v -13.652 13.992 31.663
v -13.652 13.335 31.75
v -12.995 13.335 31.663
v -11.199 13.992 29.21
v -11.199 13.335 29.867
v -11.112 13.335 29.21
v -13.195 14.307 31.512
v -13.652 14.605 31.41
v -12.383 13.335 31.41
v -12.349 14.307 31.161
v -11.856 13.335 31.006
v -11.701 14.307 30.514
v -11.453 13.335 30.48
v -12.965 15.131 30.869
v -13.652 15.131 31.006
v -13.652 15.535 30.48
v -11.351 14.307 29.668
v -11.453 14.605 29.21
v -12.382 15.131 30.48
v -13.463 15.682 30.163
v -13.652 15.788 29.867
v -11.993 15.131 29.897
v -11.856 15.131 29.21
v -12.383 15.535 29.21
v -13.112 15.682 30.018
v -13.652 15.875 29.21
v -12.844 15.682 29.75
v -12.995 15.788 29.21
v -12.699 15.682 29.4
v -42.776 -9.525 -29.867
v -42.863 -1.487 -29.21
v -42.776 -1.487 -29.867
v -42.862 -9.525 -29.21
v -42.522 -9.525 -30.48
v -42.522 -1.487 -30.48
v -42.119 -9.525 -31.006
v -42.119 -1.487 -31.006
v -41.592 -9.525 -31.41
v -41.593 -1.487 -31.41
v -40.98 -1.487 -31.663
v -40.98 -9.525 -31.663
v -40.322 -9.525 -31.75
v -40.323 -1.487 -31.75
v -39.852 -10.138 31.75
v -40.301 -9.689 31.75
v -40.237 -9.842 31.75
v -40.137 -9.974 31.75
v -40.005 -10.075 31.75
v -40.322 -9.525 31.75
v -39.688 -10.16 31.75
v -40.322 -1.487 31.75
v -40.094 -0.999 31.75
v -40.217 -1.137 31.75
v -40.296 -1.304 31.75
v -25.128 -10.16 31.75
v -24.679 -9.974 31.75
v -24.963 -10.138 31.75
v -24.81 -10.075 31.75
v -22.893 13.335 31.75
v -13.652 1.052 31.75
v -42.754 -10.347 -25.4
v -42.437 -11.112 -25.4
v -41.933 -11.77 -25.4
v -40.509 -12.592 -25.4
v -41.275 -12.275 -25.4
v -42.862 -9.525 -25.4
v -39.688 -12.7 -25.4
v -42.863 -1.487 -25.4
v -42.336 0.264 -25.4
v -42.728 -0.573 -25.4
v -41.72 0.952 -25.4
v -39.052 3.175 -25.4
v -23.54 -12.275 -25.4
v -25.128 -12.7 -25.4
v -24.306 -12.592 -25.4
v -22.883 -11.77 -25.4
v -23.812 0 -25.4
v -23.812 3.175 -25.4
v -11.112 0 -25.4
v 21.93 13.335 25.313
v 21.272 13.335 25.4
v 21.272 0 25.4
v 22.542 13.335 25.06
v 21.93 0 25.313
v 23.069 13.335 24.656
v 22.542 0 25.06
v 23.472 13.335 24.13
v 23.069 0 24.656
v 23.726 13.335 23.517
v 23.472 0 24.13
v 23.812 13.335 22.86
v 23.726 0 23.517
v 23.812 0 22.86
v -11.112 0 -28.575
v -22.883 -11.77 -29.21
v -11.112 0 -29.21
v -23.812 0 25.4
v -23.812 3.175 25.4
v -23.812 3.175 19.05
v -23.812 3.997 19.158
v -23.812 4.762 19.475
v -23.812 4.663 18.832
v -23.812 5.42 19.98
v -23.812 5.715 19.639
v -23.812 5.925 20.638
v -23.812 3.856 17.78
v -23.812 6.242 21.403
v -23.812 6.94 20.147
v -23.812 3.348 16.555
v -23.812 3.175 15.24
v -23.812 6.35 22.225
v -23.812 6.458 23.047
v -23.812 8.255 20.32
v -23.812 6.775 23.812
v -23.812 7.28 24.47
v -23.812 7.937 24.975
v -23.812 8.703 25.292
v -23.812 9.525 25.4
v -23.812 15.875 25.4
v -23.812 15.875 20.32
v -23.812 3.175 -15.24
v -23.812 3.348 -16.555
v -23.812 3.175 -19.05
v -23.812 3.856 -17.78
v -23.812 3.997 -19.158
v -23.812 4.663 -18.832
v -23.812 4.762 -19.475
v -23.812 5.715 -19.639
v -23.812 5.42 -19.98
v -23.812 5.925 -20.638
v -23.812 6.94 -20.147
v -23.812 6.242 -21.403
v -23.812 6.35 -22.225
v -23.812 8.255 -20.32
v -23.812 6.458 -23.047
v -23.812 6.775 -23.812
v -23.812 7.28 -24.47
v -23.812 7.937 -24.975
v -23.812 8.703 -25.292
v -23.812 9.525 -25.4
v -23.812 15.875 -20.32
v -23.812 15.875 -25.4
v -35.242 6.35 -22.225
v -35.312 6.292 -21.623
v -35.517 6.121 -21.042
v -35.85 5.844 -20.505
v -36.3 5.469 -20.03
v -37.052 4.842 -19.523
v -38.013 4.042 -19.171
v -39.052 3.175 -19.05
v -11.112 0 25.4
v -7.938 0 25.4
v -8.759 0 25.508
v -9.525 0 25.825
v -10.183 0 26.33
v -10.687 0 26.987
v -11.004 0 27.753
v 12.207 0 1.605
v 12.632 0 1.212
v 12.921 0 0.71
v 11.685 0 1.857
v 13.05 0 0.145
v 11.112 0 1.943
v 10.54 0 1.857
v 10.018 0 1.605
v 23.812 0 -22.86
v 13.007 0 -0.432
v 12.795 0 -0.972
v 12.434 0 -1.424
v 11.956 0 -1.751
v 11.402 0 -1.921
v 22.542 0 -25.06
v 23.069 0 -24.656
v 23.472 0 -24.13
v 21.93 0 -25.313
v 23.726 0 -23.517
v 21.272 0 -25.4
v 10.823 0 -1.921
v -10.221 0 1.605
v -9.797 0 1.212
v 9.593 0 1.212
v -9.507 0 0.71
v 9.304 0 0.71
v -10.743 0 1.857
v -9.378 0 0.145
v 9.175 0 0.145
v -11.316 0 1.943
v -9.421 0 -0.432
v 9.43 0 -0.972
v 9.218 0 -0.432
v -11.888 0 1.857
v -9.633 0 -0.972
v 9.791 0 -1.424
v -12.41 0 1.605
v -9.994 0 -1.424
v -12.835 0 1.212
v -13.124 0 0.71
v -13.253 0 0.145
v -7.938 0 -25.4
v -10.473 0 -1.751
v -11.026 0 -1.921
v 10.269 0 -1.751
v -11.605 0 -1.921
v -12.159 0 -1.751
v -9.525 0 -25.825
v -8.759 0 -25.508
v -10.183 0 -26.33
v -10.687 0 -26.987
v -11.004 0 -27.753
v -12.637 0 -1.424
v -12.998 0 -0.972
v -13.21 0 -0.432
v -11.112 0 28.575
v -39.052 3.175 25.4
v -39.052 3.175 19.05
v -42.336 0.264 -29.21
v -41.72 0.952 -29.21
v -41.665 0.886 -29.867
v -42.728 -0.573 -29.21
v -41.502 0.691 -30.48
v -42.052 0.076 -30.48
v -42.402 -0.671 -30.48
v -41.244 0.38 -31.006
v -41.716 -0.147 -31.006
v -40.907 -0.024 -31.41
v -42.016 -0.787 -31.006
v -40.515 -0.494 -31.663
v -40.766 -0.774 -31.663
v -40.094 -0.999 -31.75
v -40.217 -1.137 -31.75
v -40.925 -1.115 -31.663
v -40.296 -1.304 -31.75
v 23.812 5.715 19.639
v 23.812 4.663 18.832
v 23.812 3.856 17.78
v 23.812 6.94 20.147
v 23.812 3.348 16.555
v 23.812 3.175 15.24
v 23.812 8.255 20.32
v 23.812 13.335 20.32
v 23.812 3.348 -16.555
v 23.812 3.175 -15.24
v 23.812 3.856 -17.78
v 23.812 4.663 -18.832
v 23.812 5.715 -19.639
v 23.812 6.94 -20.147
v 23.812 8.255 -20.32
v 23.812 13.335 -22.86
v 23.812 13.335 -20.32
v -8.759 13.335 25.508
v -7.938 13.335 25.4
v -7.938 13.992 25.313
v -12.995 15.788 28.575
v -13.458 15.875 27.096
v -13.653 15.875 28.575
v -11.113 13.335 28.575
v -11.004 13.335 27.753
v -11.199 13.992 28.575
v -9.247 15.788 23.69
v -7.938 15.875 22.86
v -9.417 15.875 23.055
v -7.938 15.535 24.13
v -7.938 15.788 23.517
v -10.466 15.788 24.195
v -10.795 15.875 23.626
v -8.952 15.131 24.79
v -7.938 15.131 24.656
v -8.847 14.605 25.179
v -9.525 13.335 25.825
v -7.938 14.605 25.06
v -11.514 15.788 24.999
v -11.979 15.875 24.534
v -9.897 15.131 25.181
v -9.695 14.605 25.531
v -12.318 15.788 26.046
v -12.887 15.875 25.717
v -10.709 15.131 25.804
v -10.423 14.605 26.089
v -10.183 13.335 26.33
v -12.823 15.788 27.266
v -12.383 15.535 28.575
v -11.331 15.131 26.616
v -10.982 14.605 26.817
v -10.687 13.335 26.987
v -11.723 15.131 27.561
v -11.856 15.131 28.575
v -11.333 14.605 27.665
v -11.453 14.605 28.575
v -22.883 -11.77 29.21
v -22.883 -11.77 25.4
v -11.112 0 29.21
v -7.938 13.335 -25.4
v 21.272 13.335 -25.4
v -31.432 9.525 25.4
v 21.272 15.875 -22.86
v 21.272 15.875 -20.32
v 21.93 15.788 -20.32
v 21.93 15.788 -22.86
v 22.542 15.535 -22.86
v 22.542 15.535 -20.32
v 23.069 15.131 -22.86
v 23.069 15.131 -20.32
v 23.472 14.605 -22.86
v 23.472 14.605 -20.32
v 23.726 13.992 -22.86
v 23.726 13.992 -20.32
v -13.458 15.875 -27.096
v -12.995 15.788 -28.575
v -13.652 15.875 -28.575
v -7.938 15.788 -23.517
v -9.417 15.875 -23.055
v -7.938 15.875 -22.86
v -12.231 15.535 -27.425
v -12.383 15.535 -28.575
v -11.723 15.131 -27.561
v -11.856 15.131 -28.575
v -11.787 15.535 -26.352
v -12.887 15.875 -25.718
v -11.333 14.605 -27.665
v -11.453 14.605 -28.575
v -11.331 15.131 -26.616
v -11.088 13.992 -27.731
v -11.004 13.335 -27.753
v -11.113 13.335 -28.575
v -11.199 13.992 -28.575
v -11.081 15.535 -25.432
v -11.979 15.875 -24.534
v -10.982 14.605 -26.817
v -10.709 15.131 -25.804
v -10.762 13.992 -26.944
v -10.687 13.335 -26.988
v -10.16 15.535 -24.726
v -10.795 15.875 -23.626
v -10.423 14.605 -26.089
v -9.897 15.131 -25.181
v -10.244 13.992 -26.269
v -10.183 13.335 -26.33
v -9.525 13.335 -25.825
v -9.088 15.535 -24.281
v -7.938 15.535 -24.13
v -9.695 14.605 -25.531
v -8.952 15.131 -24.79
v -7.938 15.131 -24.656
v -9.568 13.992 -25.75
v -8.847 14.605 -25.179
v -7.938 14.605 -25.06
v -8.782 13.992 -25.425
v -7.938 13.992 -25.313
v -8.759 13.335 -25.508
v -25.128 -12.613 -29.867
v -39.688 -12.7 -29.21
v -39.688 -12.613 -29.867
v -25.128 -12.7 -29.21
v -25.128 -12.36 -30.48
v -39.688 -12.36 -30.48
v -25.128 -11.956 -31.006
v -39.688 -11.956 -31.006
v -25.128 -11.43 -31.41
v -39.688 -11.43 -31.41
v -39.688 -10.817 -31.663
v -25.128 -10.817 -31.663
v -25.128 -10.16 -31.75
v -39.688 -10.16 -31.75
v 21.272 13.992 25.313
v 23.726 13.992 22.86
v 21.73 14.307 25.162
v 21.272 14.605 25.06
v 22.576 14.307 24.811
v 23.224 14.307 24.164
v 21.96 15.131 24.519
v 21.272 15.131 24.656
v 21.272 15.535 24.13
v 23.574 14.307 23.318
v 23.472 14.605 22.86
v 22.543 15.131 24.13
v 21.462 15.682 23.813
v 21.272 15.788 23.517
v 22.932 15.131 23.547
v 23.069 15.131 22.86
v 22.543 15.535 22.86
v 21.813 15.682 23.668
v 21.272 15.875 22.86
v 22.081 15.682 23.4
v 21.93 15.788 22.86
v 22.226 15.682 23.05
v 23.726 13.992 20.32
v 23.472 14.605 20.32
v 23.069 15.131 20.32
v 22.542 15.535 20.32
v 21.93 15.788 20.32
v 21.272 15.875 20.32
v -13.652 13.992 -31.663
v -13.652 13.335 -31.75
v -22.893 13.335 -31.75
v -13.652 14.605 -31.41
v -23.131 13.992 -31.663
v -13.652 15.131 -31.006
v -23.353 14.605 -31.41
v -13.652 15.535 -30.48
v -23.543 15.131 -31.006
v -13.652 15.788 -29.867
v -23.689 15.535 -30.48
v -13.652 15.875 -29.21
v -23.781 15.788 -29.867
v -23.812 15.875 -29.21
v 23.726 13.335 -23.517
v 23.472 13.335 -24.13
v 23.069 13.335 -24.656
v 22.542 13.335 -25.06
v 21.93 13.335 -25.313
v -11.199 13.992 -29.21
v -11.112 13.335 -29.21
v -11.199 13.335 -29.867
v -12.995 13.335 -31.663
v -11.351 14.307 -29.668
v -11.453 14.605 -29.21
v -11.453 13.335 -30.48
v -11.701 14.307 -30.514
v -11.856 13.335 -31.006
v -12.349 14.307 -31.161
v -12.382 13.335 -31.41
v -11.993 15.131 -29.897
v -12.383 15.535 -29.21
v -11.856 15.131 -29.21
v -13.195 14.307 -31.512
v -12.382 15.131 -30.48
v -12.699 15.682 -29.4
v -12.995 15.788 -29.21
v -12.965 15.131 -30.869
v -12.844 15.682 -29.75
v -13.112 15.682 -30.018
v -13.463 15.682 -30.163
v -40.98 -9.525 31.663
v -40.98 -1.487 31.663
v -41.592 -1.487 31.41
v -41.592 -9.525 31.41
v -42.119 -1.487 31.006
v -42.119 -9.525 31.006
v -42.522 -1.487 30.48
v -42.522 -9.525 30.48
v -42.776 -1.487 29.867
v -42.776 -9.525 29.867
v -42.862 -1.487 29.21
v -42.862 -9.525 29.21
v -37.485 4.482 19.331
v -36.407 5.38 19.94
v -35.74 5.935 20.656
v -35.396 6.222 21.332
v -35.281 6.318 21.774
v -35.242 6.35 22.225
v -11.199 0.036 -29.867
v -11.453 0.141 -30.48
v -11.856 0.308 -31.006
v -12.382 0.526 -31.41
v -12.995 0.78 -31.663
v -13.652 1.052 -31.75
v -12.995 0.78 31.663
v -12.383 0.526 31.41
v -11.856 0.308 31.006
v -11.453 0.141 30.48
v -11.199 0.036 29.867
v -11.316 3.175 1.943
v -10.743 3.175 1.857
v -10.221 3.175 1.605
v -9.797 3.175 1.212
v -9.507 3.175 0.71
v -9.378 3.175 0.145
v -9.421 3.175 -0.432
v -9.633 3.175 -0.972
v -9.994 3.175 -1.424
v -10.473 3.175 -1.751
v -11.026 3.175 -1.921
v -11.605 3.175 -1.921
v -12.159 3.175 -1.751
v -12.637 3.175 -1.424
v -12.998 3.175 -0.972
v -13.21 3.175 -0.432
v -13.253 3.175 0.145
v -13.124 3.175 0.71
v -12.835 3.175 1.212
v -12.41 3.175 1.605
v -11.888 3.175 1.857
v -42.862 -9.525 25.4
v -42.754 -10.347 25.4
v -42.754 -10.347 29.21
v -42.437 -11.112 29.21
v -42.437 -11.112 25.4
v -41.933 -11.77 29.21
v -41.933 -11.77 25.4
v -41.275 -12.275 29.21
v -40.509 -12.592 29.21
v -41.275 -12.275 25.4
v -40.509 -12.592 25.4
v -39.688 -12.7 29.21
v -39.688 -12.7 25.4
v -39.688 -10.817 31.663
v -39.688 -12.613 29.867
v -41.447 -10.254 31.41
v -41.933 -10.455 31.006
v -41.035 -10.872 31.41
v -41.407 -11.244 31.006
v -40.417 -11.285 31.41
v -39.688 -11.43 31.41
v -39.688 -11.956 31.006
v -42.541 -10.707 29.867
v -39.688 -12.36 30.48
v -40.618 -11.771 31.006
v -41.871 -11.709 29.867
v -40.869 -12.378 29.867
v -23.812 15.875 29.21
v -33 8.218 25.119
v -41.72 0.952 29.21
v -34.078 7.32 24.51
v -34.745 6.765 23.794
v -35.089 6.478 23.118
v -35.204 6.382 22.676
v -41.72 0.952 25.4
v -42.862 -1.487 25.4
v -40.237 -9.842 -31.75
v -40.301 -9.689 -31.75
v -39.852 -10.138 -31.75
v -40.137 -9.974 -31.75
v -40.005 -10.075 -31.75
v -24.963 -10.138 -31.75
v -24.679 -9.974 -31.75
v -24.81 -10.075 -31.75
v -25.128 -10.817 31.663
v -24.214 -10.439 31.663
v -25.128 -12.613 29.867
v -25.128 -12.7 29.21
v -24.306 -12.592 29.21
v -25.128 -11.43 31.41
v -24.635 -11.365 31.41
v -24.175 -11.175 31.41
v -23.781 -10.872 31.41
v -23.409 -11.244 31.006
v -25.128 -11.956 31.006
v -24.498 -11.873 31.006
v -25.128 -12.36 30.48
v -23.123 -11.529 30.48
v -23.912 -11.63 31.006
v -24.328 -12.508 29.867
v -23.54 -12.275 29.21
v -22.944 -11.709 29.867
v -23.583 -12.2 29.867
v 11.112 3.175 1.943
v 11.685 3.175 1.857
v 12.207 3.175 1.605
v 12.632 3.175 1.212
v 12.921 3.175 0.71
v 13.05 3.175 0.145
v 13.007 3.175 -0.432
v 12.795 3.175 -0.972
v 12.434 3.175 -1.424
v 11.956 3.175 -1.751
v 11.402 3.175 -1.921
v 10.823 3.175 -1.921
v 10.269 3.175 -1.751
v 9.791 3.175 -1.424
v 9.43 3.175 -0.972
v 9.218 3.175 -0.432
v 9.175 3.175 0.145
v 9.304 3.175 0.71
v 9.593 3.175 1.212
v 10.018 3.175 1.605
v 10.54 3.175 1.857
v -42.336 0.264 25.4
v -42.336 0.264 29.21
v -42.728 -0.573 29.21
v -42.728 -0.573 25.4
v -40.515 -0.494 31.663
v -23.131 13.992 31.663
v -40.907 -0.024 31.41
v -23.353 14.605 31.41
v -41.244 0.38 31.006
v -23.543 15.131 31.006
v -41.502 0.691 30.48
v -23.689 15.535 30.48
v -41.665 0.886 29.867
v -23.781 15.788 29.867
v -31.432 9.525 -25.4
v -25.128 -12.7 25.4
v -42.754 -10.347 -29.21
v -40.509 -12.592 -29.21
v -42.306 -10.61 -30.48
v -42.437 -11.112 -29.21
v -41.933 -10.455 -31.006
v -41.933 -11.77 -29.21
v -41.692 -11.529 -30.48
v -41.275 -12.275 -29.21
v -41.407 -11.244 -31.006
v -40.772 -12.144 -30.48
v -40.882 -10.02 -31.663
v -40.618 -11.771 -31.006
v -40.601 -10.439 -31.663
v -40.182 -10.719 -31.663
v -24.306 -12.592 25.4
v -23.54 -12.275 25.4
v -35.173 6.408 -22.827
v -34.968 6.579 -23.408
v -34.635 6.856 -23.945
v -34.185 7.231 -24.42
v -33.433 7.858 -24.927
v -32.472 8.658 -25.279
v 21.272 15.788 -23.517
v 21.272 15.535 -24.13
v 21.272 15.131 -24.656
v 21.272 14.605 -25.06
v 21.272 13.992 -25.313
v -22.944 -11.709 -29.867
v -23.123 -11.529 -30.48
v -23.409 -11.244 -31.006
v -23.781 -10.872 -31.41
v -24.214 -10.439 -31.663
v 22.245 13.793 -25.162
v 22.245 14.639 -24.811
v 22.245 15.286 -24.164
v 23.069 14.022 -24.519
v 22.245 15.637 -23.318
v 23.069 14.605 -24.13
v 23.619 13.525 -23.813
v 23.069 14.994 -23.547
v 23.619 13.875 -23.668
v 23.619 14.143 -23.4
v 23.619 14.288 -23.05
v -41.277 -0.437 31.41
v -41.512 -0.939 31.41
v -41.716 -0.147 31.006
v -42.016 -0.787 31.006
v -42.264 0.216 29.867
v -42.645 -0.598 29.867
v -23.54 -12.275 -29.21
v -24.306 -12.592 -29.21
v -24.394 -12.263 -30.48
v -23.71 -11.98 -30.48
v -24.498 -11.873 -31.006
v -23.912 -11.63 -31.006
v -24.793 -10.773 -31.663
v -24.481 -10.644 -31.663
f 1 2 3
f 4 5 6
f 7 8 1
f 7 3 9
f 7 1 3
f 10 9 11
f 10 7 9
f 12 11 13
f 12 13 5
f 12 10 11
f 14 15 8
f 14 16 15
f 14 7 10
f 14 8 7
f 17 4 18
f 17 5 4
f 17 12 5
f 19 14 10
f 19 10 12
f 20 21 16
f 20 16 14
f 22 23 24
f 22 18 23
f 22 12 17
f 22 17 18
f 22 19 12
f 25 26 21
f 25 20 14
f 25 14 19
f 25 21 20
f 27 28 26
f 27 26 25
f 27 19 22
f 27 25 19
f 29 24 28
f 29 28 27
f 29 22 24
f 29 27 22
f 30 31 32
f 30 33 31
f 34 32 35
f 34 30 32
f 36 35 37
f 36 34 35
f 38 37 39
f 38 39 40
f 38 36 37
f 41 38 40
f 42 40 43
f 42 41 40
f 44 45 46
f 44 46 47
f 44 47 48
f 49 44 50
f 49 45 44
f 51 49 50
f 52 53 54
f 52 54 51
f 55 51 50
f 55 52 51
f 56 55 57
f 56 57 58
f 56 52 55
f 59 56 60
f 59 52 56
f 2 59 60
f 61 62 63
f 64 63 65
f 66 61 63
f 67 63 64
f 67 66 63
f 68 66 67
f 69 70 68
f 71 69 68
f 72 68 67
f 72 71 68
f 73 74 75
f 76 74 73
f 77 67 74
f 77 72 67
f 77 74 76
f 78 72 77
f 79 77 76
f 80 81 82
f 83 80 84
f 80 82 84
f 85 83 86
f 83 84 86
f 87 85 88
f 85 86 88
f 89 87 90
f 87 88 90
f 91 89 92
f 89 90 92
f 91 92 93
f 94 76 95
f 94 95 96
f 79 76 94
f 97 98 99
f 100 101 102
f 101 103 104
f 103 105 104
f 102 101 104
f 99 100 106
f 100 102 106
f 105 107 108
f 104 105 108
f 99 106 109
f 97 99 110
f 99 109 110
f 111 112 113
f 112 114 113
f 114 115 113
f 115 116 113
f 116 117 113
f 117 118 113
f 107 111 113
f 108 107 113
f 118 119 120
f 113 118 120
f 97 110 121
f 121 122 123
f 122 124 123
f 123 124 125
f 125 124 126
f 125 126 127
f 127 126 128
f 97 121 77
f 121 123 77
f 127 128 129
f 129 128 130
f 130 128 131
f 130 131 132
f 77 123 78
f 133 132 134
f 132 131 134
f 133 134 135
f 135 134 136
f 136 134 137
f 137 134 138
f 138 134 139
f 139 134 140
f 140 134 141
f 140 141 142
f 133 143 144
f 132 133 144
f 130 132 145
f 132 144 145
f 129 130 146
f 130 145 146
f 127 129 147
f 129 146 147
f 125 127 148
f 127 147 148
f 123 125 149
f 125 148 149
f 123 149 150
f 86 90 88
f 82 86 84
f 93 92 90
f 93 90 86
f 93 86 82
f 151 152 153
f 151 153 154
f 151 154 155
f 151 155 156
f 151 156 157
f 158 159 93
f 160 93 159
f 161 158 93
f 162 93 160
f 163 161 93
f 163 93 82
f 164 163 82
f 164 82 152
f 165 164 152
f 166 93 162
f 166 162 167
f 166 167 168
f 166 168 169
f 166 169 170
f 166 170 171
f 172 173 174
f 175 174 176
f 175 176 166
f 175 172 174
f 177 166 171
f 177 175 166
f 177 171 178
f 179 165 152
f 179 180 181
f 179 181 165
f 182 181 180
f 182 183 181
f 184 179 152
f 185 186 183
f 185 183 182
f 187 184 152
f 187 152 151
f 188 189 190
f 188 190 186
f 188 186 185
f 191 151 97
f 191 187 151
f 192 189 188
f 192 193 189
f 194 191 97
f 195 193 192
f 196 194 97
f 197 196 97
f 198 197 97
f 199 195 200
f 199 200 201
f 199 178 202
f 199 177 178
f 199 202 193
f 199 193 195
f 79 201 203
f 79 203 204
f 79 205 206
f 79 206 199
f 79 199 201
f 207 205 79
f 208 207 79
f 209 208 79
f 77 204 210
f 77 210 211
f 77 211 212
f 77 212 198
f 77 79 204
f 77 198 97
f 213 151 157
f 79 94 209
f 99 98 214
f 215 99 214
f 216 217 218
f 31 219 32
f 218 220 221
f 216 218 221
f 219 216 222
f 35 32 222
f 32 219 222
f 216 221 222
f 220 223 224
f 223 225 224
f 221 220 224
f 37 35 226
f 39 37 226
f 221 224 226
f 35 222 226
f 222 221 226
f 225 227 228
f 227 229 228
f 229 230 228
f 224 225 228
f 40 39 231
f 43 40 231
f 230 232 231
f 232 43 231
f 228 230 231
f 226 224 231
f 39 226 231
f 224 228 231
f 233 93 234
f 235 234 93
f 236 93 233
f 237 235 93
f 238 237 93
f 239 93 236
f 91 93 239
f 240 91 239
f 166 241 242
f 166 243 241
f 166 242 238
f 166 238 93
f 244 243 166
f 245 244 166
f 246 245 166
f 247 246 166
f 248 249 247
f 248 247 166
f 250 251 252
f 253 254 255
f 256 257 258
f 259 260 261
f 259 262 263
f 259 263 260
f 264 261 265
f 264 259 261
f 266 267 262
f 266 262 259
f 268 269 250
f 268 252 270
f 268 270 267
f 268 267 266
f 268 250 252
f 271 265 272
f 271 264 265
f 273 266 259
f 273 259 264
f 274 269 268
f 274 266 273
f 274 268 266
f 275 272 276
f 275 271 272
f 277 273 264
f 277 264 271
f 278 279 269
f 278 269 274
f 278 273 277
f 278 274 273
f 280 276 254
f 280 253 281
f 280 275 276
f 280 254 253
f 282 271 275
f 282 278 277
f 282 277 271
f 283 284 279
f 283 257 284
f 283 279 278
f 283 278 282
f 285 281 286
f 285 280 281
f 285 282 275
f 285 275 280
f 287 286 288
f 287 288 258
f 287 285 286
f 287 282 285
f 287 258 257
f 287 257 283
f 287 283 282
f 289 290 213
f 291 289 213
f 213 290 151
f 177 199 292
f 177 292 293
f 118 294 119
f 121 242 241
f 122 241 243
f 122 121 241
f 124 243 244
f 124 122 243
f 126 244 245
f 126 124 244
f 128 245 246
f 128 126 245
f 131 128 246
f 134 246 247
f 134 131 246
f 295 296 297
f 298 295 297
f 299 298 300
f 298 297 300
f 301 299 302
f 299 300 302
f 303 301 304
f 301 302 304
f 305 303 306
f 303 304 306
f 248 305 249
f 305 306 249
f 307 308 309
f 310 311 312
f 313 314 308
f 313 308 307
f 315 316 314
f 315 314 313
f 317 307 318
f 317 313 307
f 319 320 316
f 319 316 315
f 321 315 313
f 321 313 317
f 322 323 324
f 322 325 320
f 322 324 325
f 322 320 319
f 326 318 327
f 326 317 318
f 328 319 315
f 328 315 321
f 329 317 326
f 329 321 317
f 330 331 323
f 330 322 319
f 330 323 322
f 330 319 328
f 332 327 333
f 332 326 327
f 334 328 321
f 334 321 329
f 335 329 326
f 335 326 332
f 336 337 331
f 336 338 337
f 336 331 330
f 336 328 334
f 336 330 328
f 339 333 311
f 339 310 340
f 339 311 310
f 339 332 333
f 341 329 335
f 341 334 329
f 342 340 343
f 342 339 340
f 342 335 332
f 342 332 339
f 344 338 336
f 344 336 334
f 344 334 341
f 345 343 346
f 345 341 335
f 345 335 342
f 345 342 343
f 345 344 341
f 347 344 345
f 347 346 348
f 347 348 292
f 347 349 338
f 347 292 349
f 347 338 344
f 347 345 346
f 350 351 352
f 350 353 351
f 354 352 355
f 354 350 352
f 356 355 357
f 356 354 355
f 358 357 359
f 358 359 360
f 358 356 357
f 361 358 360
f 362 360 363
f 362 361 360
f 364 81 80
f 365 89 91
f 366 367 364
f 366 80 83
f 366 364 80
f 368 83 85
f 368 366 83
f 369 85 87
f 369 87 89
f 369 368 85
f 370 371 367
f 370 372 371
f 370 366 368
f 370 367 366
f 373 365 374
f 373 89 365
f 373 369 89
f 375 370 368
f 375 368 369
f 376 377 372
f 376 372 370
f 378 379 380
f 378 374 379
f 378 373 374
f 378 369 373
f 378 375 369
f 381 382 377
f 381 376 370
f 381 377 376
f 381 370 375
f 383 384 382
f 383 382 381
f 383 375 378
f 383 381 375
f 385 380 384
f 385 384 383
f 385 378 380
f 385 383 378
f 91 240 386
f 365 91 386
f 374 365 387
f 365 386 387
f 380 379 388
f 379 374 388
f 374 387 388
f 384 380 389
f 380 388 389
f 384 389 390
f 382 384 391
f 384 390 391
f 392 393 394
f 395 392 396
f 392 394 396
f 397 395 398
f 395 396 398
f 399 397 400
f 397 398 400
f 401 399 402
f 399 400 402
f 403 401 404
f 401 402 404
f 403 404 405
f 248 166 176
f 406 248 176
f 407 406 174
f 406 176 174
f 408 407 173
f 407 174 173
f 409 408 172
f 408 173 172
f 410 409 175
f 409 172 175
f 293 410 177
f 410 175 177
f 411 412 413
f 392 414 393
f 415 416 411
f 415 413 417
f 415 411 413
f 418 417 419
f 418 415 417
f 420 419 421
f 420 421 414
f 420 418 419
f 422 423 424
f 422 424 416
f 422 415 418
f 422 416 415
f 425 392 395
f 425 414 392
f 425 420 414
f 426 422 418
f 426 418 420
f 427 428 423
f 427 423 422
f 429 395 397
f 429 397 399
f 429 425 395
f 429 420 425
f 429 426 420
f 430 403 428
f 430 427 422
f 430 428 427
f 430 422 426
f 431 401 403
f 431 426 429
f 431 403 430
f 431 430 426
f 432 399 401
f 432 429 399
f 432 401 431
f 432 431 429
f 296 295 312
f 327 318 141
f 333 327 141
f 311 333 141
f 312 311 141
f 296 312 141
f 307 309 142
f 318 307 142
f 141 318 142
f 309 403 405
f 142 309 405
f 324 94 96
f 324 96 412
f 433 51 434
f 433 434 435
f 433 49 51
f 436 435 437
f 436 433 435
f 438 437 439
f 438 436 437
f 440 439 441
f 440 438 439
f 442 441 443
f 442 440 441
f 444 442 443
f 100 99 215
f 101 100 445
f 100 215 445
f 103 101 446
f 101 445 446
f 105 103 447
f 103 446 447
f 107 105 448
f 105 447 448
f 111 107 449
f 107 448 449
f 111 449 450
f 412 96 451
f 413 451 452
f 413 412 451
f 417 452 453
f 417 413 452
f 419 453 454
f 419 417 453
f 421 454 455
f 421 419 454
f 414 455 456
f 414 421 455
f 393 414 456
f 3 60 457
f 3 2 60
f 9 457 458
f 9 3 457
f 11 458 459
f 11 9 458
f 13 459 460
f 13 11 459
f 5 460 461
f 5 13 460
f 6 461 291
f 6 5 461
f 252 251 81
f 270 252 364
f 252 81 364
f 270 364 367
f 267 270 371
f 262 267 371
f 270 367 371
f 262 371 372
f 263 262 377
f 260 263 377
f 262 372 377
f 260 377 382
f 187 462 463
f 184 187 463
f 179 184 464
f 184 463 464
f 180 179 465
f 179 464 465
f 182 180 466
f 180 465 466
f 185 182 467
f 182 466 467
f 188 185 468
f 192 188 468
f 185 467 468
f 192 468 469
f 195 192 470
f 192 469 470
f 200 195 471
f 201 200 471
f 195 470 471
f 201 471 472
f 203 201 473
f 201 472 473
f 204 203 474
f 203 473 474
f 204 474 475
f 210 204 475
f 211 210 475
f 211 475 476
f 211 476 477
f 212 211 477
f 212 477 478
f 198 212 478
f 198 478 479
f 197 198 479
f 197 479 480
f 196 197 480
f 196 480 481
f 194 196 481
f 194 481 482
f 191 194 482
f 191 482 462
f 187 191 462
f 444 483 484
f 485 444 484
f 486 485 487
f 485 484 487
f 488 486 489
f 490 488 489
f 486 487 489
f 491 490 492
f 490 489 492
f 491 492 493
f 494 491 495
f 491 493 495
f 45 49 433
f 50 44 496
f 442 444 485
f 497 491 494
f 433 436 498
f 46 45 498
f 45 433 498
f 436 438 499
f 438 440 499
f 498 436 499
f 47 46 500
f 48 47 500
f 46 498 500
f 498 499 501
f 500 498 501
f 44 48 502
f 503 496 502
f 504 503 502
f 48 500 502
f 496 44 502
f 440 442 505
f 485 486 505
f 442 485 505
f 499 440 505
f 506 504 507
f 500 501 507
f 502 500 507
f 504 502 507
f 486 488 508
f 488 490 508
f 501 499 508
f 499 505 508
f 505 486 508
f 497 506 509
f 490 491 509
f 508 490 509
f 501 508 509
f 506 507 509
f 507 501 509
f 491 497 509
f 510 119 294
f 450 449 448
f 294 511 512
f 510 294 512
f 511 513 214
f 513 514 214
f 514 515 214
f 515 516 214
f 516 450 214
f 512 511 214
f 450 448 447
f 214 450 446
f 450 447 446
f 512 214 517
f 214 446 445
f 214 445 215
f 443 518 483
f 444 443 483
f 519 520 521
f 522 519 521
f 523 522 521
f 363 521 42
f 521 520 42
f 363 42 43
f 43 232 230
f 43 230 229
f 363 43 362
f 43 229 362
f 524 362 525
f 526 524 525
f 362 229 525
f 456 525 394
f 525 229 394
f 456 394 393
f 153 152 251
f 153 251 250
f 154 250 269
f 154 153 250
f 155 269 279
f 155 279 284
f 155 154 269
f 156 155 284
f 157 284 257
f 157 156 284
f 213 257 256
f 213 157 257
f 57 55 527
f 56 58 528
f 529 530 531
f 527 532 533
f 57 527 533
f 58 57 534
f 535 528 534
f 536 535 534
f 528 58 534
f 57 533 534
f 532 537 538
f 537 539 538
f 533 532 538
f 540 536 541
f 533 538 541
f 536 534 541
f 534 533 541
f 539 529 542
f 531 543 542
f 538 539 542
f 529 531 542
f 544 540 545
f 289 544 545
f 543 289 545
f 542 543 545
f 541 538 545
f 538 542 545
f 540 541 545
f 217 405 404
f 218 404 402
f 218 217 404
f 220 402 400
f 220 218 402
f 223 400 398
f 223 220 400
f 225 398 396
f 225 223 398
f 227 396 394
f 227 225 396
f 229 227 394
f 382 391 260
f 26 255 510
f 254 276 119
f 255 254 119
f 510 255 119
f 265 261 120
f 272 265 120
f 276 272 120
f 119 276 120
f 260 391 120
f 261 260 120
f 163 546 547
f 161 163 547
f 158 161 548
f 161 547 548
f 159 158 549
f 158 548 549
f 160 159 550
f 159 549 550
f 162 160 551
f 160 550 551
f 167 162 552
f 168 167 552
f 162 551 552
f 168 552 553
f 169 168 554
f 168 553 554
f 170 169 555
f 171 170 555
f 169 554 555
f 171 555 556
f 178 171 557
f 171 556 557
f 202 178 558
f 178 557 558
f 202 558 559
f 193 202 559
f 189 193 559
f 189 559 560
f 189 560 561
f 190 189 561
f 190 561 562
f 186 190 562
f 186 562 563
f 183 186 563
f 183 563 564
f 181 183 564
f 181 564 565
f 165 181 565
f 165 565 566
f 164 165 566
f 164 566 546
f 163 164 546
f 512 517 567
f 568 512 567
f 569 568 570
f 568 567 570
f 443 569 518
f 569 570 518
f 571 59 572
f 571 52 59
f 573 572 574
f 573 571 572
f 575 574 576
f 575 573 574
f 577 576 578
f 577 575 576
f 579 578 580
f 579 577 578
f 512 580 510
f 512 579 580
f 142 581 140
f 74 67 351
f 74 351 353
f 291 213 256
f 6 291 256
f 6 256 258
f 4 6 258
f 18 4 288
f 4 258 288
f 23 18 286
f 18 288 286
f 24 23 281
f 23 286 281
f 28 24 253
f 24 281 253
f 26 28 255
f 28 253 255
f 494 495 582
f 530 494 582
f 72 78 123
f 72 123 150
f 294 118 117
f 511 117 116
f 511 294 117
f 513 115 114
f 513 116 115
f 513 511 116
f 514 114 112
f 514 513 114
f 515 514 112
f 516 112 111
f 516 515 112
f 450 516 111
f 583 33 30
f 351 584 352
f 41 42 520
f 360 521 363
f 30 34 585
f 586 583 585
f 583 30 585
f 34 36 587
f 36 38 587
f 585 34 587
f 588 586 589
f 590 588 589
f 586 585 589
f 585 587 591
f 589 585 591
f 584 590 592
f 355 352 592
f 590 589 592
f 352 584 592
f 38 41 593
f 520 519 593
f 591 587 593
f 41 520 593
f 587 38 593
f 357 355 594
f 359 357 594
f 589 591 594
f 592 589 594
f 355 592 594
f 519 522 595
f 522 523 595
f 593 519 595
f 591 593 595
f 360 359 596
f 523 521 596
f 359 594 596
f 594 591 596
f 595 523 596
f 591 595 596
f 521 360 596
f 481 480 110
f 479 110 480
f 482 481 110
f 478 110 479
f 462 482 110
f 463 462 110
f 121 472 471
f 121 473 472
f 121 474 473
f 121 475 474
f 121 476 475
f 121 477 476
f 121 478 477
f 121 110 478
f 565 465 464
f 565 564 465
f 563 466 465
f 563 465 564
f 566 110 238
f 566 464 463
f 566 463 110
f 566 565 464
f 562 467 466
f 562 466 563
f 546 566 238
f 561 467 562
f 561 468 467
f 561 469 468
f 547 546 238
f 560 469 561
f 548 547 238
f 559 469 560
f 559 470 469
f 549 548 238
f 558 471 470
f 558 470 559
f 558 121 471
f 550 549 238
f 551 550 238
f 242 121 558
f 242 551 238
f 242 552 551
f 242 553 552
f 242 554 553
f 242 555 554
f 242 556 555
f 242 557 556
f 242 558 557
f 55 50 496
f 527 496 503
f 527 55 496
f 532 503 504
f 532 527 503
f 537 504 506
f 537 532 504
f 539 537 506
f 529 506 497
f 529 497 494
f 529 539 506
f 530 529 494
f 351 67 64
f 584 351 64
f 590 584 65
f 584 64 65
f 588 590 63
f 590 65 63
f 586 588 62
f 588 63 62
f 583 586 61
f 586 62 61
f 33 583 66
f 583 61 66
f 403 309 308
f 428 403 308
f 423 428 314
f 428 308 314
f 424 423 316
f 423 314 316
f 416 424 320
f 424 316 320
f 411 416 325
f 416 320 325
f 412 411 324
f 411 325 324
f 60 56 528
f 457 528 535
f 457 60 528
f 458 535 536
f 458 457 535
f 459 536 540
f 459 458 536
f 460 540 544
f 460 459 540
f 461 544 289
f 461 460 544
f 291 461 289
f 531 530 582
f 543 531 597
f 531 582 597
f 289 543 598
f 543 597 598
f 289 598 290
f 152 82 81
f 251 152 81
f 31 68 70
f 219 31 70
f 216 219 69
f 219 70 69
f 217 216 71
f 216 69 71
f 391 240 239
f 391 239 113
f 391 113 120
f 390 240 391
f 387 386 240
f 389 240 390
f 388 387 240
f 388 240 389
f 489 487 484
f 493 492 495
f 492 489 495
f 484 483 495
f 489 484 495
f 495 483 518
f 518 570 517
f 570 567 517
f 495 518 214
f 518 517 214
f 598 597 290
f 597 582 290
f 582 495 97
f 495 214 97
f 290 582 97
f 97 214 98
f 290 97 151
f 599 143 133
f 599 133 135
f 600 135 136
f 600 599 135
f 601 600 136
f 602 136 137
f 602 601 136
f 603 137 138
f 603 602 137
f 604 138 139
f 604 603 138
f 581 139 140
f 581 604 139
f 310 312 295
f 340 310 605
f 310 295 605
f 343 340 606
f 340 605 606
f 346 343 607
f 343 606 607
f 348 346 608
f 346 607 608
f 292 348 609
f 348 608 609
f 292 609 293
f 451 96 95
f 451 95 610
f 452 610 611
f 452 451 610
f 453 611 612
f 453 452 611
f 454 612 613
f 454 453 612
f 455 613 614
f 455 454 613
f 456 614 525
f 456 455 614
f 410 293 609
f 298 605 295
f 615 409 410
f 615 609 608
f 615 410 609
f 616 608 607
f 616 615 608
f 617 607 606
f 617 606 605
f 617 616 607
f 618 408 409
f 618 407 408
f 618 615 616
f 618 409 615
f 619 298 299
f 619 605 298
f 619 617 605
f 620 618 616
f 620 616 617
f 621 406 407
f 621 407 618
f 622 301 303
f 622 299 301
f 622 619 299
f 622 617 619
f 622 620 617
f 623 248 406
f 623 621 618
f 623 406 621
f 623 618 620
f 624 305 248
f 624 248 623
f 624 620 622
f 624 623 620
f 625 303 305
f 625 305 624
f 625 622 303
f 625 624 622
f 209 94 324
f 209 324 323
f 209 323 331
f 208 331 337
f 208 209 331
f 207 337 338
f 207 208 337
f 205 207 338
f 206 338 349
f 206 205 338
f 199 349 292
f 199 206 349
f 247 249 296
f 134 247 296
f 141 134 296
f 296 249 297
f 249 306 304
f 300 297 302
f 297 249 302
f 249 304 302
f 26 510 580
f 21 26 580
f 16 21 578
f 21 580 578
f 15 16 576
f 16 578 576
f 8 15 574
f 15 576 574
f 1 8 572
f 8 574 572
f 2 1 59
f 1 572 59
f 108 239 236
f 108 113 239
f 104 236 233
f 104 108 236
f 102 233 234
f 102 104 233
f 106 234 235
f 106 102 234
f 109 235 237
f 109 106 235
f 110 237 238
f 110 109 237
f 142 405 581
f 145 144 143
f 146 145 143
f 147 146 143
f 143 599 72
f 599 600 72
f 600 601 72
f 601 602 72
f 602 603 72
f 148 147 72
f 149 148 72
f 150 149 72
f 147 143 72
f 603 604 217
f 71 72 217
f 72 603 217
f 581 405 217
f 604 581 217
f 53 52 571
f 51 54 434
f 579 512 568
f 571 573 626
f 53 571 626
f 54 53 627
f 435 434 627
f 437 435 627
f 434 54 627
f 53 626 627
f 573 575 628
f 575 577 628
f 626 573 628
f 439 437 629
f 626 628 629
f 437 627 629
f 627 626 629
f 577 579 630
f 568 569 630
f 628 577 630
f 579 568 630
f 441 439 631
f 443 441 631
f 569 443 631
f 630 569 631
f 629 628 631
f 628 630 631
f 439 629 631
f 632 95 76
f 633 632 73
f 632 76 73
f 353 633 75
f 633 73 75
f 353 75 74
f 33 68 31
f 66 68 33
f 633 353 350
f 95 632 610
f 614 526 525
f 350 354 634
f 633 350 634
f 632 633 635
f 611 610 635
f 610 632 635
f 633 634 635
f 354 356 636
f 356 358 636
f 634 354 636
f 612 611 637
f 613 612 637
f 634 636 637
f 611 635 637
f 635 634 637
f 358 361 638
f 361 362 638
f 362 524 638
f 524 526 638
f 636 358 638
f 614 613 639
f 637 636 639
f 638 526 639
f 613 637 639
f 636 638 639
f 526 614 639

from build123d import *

# Parameters (mm, degrees)
SKETCH1_W           = 47.625
SKETCH1_H           = 50.8
BOSS_EXTRUDE1_DEPTH = 3.175
SKETCH2_R           = 1.9431
CUT_EXTRUDE1_DEPTH  = 35.961060929
SKETCH3_W           = 5.08
SKETCH3_H           = 12.7
BOSS_EXTRUDE2_DEPTH = 47.625
FILLET1_R           = 5.08
BOSS_EXTRUDE4_DEPTH = 6.35
FILLET4_R           = 3.175
BOSS_EXTRUDE5_DEPTH = 6.35
FILLET6_R           = 3.175
BOSS_EXTRUDE6_DEPTH = 6.35
FILLET8_R           = 3.175
FILLET9_R           = 3.175
FILLET10_R          = 2.54
FILLET11_R          = 2.54
FILLET12_R          = 2.54


with BuildPart() as part:
    # Sketch1 → Boss-Extrude1 (new body)
    with BuildSketch(Plane(origin=(0, 0, 0), x_dir=(1, 0, 0), z_dir=(0, 1, 0))):
        Rectangle(SKETCH1_W, SKETCH1_H)
    extrude(amount=BOSS_EXTRUDE1_DEPTH)

    # Sketch2 → Cut-Extrude1 (cut, through all)
    with BuildSketch(Plane(origin=(0, 3.175, 0), x_dir=(1, 0, 0), z_dir=(0, 1, 0))):
        with Locations(Location((11.1125, 0, 0), (0, 0, 270))):
            Circle(SKETCH2_R)
        with Locations(Location((-11.3157, 0, 0), (0, 0, 270))):
            Circle(SKETCH2_R)
    extrude(amount=-CUT_EXTRUDE1_DEPTH, mode=Mode.SUBTRACT)

    # Sketch3 → Boss-Extrude2 (add)
    with BuildSketch(Plane(origin=(23.8125, 0, 0), x_dir=(0, 0, -1), z_dir=(1, 0, 0))):
        with Locations((-22.86, 9.525)):
            Rectangle(SKETCH3_W, SKETCH3_H)
        with Locations((22.86, 9.525)):
            Rectangle(SKETCH3_W, SKETCH3_H)
    extrude(amount=-BOSS_EXTRUDE2_DEPTH)

    # Fillet1
    fillet1_edges = [part.edges().sort_by_distance(p)[0] for p in [
        (0, 3.175, 20.32),
        (0, 3.175, -20.32),
    ]]
    fillet(fillet1_edges, radius=FILLET1_R)

    # Sketch5 → Boss-Extrude4 (add)
    with BuildSketch(Plane(origin=(0, 0, -25.4), x_dir=(-1, 0, 0), z_dir=(0, 0, -1))):
        Polygon((11.1125, 15.875), (23.8125, 15.875), (42.8625, 0), (42.8625, -12.7), (23.8125, -12.7), (11.1125, 0), align=None)
    extrude(amount=BOSS_EXTRUDE4_DEPTH)

    # Fillet4
    # the kernel refuses this fillet: 3.175 mm, written as the material it adds along each edge
    with BuildSketch(Plane(origin=(-11.1125, 0, -25.4), x_dir=(1, 0, 0), z_dir=(0, 1, 0))) as fillet4_piece_1:
        with BuildLine():
            CenterArc((FILLET4_R, FILLET4_R), FILLET4_R, 180, 90)
            Line((0, FILLET4_R), (0, 0))
            Line((0, 0), (FILLET4_R, 0))
        make_face()
    extrude(amount=15.875)
    # the kernel refuses this fillet: 3.175 mm, written as the material it takes off along each edge
    with BuildSketch(Plane(origin=(-23.8125, -12.7, -22.112179849), x_dir=(0.7071067811865468, 0.7071067811865482, 0), z_dir=(0, 0, -1))) as fillet4_2_piece_1:
        with BuildLine():
            CenterArc((FILLET4_R * 0.414213562373, -FILLET4_R), FILLET4_R, 90, 45)
            Line((-FILLET4_R * 0.292893218813, -FILLET4_R * 0.292893218813), (0, 0))
            Line((0, 0), (FILLET4_R * 0.414213562373, 0))
        make_face()
    extrude(amount=12.925640303, mode=Mode.SUBTRACT)
    with BuildSketch(Plane(origin=(-42.8625, -12.7, -17.4625), x_dir=(1, 0, 0), z_dir=(0, 0, -1))) as fillet4_2_piece_2:
        with BuildLine():
            CenterArc((FILLET4_R, -FILLET4_R), FILLET4_R, 90, 90)
            Line((0, -FILLET4_R), (0, 0))
            Line((0, 0), (FILLET4_R, 0))
        make_face()
    extrude(amount=22.225, mode=Mode.SUBTRACT)
    with BuildSketch(Plane(origin=(-42.8625, 0, -21.682273866), x_dir=(0.7682212795973764, 0.6401843996644792, 0), z_dir=(0, 0, -1))) as fillet4_2_piece_3:
        with BuildLine():
            CenterArc((FILLET4_R * 0.468374945984, FILLET4_R), FILLET4_R, 219.805571092, 50.194428908)
            Line((-FILLET4_R * 0.299846333613, FILLET4_R * 0.359815600336), (0, 0))
            Line((0, 0), (FILLET4_R * 0.468374945984, 0))
        make_face()
    extrude(amount=13.785452268, mode=Mode.SUBTRACT)

    # Sketch6 → Boss-Extrude5 (add)
    with BuildSketch(Plane.XY.offset(25.4)):
        Polygon((-11.1125, 15.875), (-23.8125, 15.875), (-42.8625, 0), (-42.8625, -12.7), (-23.8125, -12.7), (-11.1125, 0), align=None)
    extrude(amount=BOSS_EXTRUDE5_DEPTH)

    # Fillet6
    # the kernel refuses this fillet: 3.175 mm, written as the material it adds along each edge
    with BuildSketch(Plane(origin=(-11.1125, 0, 25.4), x_dir=(1, 0, 0), z_dir=(0, 1, 0))) as fillet6_piece_1:
        with BuildLine():
            CenterArc((FILLET6_R, -FILLET6_R), FILLET6_R, 90, 90)
            Line((0, -FILLET6_R), (0, 0))
            Line((0, 0), (FILLET6_R, 0))
        make_face()
    extrude(amount=15.875)
    # the kernel refuses this fillet: 3.175 mm, written as the material it takes off along each edge
    with BuildSketch(Plane(origin=(-42.8625, 0, 21.682273866), x_dir=(0, -1, 0), z_dir=(0, 0, 1))) as fillet6_2_piece_1:
        with BuildLine():
            CenterArc((FILLET6_R * 0.468374945984, FILLET6_R), FILLET6_R, 219.805571092, 50.194428908)
            Line((-FILLET6_R * 0.299846333613, FILLET6_R * 0.359815600336), (0, 0))
            Line((0, 0), (FILLET6_R * 0.468374945984, 0))
        make_face()
    extrude(amount=13.785452268, mode=Mode.SUBTRACT)
    with BuildSketch(Plane(origin=(-42.8625, -12.7, 17.4625), x_dir=(1, 0, 0), z_dir=(0, 0, 1))) as fillet6_2_piece_2:
        with BuildLine():
            CenterArc((FILLET6_R, FILLET6_R), FILLET6_R, 180, 90)
            Line((0, FILLET6_R), (0, 0))
            Line((0, 0), (FILLET6_R, 0))
        make_face()
    extrude(amount=22.225, mode=Mode.SUBTRACT)
    with BuildSketch(Plane(origin=(-23.8125, -12.7, 22.112179849), x_dir=(0.7071067811865468, 0.7071067811865482, 0), z_dir=(0, 0, 1))) as fillet6_2_piece_3:
        with BuildLine():
            CenterArc((FILLET6_R * 0.414213562373, FILLET6_R), FILLET6_R, 225, 45)
            Line((-FILLET6_R * 0.292893218813, FILLET6_R * 0.292893218813), (0, 0))
            Line((0, 0), (FILLET6_R * 0.414213562373, 0))
        make_face()
    extrude(amount=12.925640303, mode=Mode.SUBTRACT)

    # Sketch7 → Boss-Extrude6 (add)
    with BuildSketch(Plane.XY.offset(-25.4)):
        Polygon((-23.8125, 3.175), (-39.0525, 3.175), (-35.2425, 6.35), (-23.8125, 6.35), align=None)
    boss_extrude6 = extrude(amount=BOSS_EXTRUDE6_DEPTH)

    # Fillet8
    # the kernel refuses this fillet: 3.175 mm, written as the material it adds along each edge
    with BuildSketch(Plane(origin=(-43.18, 6.35, -25.4), x_dir=(0, 0, 1), z_dir=(1, 0, 0))) as fillet8_piece_1_section:
        with BuildLine():
            CenterArc((FILLET8_R, -FILLET8_R), FILLET8_R, 90, 90)
            Line((0, -FILLET8_R), (0, 0))
            Line((0, 0), (FILLET8_R, 0))
        make_face()
    fillet8_piece_1 = extrude(amount=27.305, mode=Mode.PRIVATE)
    fillet8_piece_1 = split(fillet8_piece_1, bisect_by=Plane(origin=(-31.306679487, 9.629850427, -24.649765277), z_dir=(0.6401843996644798, -0.768221279597376, 0)), keep=Keep.TOP, mode=Mode.PRIVATE)
    add(fillet8_piece_1)
    # the kernel refuses this fillet: 3.175 mm, written as the material it takes off along each edge
    with BuildSketch(Plane(origin=(-43.18, 6.35, -19.05), x_dir=(0, -1, 0), z_dir=(1, 0, 0))) as fillet8_2_piece_1:
        with BuildLine():
            CenterArc((FILLET8_R, FILLET8_R), FILLET8_R, 180, 90)
            Line((0, FILLET8_R), (0, 0))
            Line((0, 0), (FILLET8_R, 0))
        make_face()
    extrude(amount=19.3675, mode=Mode.SUBTRACT)

    # Mirror5: Boss-Extrude6 across plane
    add(boss_extrude6.mirror(Plane.XY))

    # Fillet9
    # the kernel refuses this fillet: 3.175 mm, written as the material it adds along each edge
    with BuildSketch(Plane(origin=(-43.18, 6.35, 25.4), x_dir=(0, 0, -1), z_dir=(1, 0, 0))) as fillet9_piece_1_section:
        with BuildLine():
            CenterArc((FILLET9_R, FILLET9_R), FILLET9_R, 180, 90)
            Line((0, FILLET9_R), (0, 0))
            Line((0, 0), (FILLET9_R, 0))
        make_face()
    fillet9_piece_1 = extrude(amount=27.305, mode=Mode.PRIVATE)
    fillet9_piece_1 = split(fillet9_piece_1, bisect_by=Plane(origin=(-31.306679487, 9.629850427, 24.649765277), z_dir=(0.6401843996644802, -0.7682212795973757, 0)), keep=Keep.TOP, mode=Mode.PRIVATE)
    add(fillet9_piece_1)
    # the kernel refuses this fillet: 3.175 mm, written as the material it takes off along each edge
    with BuildSketch(Plane(origin=(-43.18, 6.35, 19.05), x_dir=(0, -1, 0), z_dir=(1, 0, 0))) as fillet9_2_piece_1:
        with BuildLine():
            CenterArc((FILLET9_R, -FILLET9_R), FILLET9_R, 90, 90)
            Line((0, -FILLET9_R), (0, 0))
            Line((0, 0), (FILLET9_R, 0))
        make_face()
    extrude(amount=19.3675, mode=Mode.SUBTRACT)

    # Fillet10
    fillet10_edges = [part.edges().sort_by_distance(p)[0] for p in [
        (-11.1125, 7.9375, 31.75),
        (-17.4625, 15.875, 31.75),
        (-32.766292734, 8.413506055, 31.75),
        (-16.997532015, -5.885032015, 31.75),
        (-32.40756403, -12.7, 31.75),
        (-42.8625, -5.506045227, 31.75),
        (-42.562746412, -0.14039707, 31.75),
        (-41.93256403, -11.77006403, 31.75),
        (-23.912608163, -12.458317516, 31.75),
        (-11.1125, 7.9375, -31.75),
        (-16.997532015, -5.885032015, -31.75),
        (-17.4625, 15.875, -31.75),
        (-32.40756403, -12.7, -31.75),
        (-42.8625, -5.506045227, -31.75),
        (-32.766292734, 8.413506055, -31.75),
        (-42.562746412, -0.14039707, -31.75),
        (-41.93256403, -11.77006403, -31.75),
        (-23.912608163, -12.458317516, -31.75),
    ]]
    fillet(fillet10_edges, radius=FILLET10_R)

    # Fillet11
    # the kernel refuses this fillet: 2.54 mm, written as the material it takes off along each edge
    with BuildSketch(Plane(origin=(-13.6525, 13.335, 29.21), x_dir=(1, 0, 0), z_dir=(0, 1, 0))) as fillet11_piece_1_section:
        Polygon((0, 0), (FILLET11_R, 0), (FILLET11_R, -FILLET11_R), (0, -FILLET11_R), align=None)
    fillet11_piece_1 = extrude(amount=FILLET11_R, mode=Mode.PRIVATE)
    fillet11_piece_1 = fillet11_piece_1 - Plane(origin=(-13.6525, 13.335, 29.21), x_dir=(-0.7071067811865475, 0, -0.7071067811865475), z_dir=(0, 1, 0)) * Sphere(FILLET11_R, mode=Mode.PRIVATE)
    add(fillet11_piece_1, mode=Mode.SUBTRACT)
    with BuildSketch(Plane(origin=(-13.6525, 13.335, -29.21), x_dir=(1, 0, 0), z_dir=(0, 1, 0))) as fillet11_piece_2_section:
        Polygon((0, 0), (FILLET11_R, 0), (FILLET11_R, FILLET11_R), (0, FILLET11_R), align=None)
    fillet11_piece_2 = extrude(amount=FILLET11_R, mode=Mode.PRIVATE)
    fillet11_piece_2 = fillet11_piece_2 - Plane(origin=(-13.6525, 13.335, -29.21), x_dir=(-0.7071067811865475, 0, 0.7071067811865475), z_dir=(0, 1, 0)) * Sphere(FILLET11_R, mode=Mode.PRIVATE)
    add(fillet11_piece_2, mode=Mode.SUBTRACT)
    with BuildSketch(Plane(origin=(30.1625, 15.875, 25.4), x_dir=(0, 0, -1), z_dir=(-1, 0, 0))) as fillet11_piece_3:
        with BuildLine():
            CenterArc((FILLET11_R, FILLET11_R), FILLET11_R, 180, 90)
            Line((0, FILLET11_R), (0, 0))
            Line((0, 0), (FILLET11_R, 0))
        make_face()
    extrude(amount=38.1, mode=Mode.SUBTRACT)
    with BuildSketch(Plane(origin=(-7.9375, 15.875, 28.575), x_dir=(0, 0, -1), z_dir=(1, 0, 0))) as fillet11_piece_4:
        with BuildLine():
            CenterArc((3.175 + FILLET11_R, -FILLET11_R), FILLET11_R, 90, 90)
            Line((3.175, -FILLET11_R), (3.175, 0))
            Line((3.175, 0), (3.175 + FILLET11_R, 0))
        make_face()
    revolve(axis=Axis((-7.9375, 15.875, 28.575), (0, 1, 0)), revolution_arc=90, mode=Mode.SUBTRACT)
    with BuildSketch(Plane(origin=(-11.1125, 15.875, 28.575), x_dir=(-1, 0, 0), z_dir=(0, 0, 1))) as fillet11_piece_5:
        with BuildLine():
            CenterArc((FILLET11_R, FILLET11_R), FILLET11_R, 180, 90)
            Line((0, FILLET11_R), (0, 0))
            Line((0, 0), (FILLET11_R, 0))
        make_face()
    extrude(amount=0.635, mode=Mode.SUBTRACT)
    with BuildSketch(Plane(origin=(-11.1125, 15.875, -28.575), x_dir=(-1, 0, 0), z_dir=(0, 0, -1))) as fillet11_piece_6:
        with BuildLine():
            CenterArc((FILLET11_R, -FILLET11_R), FILLET11_R, 90, 90)
            Line((0, -FILLET11_R), (0, 0))
            Line((0, 0), (FILLET11_R, 0))
        make_face()
    extrude(amount=0.635, mode=Mode.SUBTRACT)
    with BuildSketch(Plane(origin=(23.8125, -6.35, 25.4), x_dir=(-1, 0, 0), z_dir=(0, 1, 0)), Plane(origin=(23.8125, -6.35, -25.4), x_dir=(0, 0, 1), z_dir=(0, 1, 0))) as fillet11_piece_7:
        with BuildLine():
            CenterArc((FILLET11_R, -FILLET11_R), FILLET11_R, 90, 90)
            Line((0, -FILLET11_R), (0, 0))
            Line((0, 0), (FILLET11_R, 0))
        make_face()
    extrude(amount=28.575, mode=Mode.SUBTRACT)
    with BuildSketch(Plane(origin=(30.1625, 15.875, -25.4), x_dir=(0, 0, 1), z_dir=(-1, 0, 0))) as fillet11_piece_8:
        with BuildLine():
            CenterArc((FILLET11_R, -FILLET11_R), FILLET11_R, 90, 90)
            Line((0, -FILLET11_R), (0, 0))
            Line((0, 0), (FILLET11_R, 0))
        make_face()
    extrude(amount=38.1, mode=Mode.SUBTRACT)
    with BuildSketch(Plane(origin=(-7.9375, 15.875, -28.575), x_dir=(-1, 0, 0), z_dir=(0, 0, -1))) as fillet11_piece_9:
        with BuildLine():
            CenterArc((3.175 + FILLET11_R, -FILLET11_R), FILLET11_R, 90, 90)
            Line((3.175, -FILLET11_R), (3.175, 0))
            Line((3.175, 0), (3.175 + FILLET11_R, 0))
        make_face()
    revolve(axis=Axis((-7.9375, 15.875, -28.575), (0, 1, 0)), revolution_arc=90, mode=Mode.SUBTRACT)

    # Fillet12
    # the kernel refuses this fillet: 2.54 mm, written as the material it takes off along each edge
    with BuildSketch(Plane(origin=(21.2725, 13.335, 22.86), x_dir=(1, 0, 0), z_dir=(0, 1, 0))) as fillet12_piece_1_section:
        Polygon((0, 0), (FILLET12_R, 0), (FILLET12_R, -FILLET12_R), (0, -FILLET12_R), align=None)
    fillet12_piece_1 = extrude(amount=FILLET12_R, mode=Mode.PRIVATE)
    fillet12_piece_1 = fillet12_piece_1 - Plane(origin=(21.2725, 13.335, 22.86), x_dir=(-0.7071067811865475, 0, -0.7071067811865475), z_dir=(0, 1, 0)) * Sphere(FILLET12_R, mode=Mode.PRIVATE)
    add(fillet12_piece_1, mode=Mode.SUBTRACT)
    with BuildSketch(Plane(origin=(21.2725, 13.335, -22.86), x_dir=(0, 1, 0), z_dir=(1, 0, 0))) as fillet12_piece_2_section:
        Polygon((0, 0), (FILLET12_R, 0), (FILLET12_R, -FILLET12_R), (0, -FILLET12_R), align=None)
    fillet12_piece_2 = extrude(amount=FILLET12_R, mode=Mode.PRIVATE)
    fillet12_piece_2 = fillet12_piece_2 - Plane(origin=(21.2725, 13.335, -22.86), x_dir=(0, -0.7071067811865475, 0.7071067811865475), z_dir=(1, 0, 0)) * Sphere(FILLET12_R, mode=Mode.PRIVATE)
    add(fillet12_piece_2, mode=Mode.SUBTRACT)
    with BuildSketch(Plane(origin=(23.8125, 15.875, 13.97), x_dir=(-1, 0, 0), z_dir=(0, 0, 1)), Plane(origin=(23.8125, 15.875, -13.97), x_dir=(0, -1, 0), z_dir=(0, 0, -1))) as fillet12_piece_3:
        with BuildLine():
            CenterArc((FILLET12_R, FILLET12_R), FILLET12_R, 180, 90)
            Line((0, FILLET12_R), (0, 0))
            Line((0, 0), (FILLET12_R, 0))
        make_face()
    extrude(amount=8.89, mode=Mode.SUBTRACT)


solid = part.part
